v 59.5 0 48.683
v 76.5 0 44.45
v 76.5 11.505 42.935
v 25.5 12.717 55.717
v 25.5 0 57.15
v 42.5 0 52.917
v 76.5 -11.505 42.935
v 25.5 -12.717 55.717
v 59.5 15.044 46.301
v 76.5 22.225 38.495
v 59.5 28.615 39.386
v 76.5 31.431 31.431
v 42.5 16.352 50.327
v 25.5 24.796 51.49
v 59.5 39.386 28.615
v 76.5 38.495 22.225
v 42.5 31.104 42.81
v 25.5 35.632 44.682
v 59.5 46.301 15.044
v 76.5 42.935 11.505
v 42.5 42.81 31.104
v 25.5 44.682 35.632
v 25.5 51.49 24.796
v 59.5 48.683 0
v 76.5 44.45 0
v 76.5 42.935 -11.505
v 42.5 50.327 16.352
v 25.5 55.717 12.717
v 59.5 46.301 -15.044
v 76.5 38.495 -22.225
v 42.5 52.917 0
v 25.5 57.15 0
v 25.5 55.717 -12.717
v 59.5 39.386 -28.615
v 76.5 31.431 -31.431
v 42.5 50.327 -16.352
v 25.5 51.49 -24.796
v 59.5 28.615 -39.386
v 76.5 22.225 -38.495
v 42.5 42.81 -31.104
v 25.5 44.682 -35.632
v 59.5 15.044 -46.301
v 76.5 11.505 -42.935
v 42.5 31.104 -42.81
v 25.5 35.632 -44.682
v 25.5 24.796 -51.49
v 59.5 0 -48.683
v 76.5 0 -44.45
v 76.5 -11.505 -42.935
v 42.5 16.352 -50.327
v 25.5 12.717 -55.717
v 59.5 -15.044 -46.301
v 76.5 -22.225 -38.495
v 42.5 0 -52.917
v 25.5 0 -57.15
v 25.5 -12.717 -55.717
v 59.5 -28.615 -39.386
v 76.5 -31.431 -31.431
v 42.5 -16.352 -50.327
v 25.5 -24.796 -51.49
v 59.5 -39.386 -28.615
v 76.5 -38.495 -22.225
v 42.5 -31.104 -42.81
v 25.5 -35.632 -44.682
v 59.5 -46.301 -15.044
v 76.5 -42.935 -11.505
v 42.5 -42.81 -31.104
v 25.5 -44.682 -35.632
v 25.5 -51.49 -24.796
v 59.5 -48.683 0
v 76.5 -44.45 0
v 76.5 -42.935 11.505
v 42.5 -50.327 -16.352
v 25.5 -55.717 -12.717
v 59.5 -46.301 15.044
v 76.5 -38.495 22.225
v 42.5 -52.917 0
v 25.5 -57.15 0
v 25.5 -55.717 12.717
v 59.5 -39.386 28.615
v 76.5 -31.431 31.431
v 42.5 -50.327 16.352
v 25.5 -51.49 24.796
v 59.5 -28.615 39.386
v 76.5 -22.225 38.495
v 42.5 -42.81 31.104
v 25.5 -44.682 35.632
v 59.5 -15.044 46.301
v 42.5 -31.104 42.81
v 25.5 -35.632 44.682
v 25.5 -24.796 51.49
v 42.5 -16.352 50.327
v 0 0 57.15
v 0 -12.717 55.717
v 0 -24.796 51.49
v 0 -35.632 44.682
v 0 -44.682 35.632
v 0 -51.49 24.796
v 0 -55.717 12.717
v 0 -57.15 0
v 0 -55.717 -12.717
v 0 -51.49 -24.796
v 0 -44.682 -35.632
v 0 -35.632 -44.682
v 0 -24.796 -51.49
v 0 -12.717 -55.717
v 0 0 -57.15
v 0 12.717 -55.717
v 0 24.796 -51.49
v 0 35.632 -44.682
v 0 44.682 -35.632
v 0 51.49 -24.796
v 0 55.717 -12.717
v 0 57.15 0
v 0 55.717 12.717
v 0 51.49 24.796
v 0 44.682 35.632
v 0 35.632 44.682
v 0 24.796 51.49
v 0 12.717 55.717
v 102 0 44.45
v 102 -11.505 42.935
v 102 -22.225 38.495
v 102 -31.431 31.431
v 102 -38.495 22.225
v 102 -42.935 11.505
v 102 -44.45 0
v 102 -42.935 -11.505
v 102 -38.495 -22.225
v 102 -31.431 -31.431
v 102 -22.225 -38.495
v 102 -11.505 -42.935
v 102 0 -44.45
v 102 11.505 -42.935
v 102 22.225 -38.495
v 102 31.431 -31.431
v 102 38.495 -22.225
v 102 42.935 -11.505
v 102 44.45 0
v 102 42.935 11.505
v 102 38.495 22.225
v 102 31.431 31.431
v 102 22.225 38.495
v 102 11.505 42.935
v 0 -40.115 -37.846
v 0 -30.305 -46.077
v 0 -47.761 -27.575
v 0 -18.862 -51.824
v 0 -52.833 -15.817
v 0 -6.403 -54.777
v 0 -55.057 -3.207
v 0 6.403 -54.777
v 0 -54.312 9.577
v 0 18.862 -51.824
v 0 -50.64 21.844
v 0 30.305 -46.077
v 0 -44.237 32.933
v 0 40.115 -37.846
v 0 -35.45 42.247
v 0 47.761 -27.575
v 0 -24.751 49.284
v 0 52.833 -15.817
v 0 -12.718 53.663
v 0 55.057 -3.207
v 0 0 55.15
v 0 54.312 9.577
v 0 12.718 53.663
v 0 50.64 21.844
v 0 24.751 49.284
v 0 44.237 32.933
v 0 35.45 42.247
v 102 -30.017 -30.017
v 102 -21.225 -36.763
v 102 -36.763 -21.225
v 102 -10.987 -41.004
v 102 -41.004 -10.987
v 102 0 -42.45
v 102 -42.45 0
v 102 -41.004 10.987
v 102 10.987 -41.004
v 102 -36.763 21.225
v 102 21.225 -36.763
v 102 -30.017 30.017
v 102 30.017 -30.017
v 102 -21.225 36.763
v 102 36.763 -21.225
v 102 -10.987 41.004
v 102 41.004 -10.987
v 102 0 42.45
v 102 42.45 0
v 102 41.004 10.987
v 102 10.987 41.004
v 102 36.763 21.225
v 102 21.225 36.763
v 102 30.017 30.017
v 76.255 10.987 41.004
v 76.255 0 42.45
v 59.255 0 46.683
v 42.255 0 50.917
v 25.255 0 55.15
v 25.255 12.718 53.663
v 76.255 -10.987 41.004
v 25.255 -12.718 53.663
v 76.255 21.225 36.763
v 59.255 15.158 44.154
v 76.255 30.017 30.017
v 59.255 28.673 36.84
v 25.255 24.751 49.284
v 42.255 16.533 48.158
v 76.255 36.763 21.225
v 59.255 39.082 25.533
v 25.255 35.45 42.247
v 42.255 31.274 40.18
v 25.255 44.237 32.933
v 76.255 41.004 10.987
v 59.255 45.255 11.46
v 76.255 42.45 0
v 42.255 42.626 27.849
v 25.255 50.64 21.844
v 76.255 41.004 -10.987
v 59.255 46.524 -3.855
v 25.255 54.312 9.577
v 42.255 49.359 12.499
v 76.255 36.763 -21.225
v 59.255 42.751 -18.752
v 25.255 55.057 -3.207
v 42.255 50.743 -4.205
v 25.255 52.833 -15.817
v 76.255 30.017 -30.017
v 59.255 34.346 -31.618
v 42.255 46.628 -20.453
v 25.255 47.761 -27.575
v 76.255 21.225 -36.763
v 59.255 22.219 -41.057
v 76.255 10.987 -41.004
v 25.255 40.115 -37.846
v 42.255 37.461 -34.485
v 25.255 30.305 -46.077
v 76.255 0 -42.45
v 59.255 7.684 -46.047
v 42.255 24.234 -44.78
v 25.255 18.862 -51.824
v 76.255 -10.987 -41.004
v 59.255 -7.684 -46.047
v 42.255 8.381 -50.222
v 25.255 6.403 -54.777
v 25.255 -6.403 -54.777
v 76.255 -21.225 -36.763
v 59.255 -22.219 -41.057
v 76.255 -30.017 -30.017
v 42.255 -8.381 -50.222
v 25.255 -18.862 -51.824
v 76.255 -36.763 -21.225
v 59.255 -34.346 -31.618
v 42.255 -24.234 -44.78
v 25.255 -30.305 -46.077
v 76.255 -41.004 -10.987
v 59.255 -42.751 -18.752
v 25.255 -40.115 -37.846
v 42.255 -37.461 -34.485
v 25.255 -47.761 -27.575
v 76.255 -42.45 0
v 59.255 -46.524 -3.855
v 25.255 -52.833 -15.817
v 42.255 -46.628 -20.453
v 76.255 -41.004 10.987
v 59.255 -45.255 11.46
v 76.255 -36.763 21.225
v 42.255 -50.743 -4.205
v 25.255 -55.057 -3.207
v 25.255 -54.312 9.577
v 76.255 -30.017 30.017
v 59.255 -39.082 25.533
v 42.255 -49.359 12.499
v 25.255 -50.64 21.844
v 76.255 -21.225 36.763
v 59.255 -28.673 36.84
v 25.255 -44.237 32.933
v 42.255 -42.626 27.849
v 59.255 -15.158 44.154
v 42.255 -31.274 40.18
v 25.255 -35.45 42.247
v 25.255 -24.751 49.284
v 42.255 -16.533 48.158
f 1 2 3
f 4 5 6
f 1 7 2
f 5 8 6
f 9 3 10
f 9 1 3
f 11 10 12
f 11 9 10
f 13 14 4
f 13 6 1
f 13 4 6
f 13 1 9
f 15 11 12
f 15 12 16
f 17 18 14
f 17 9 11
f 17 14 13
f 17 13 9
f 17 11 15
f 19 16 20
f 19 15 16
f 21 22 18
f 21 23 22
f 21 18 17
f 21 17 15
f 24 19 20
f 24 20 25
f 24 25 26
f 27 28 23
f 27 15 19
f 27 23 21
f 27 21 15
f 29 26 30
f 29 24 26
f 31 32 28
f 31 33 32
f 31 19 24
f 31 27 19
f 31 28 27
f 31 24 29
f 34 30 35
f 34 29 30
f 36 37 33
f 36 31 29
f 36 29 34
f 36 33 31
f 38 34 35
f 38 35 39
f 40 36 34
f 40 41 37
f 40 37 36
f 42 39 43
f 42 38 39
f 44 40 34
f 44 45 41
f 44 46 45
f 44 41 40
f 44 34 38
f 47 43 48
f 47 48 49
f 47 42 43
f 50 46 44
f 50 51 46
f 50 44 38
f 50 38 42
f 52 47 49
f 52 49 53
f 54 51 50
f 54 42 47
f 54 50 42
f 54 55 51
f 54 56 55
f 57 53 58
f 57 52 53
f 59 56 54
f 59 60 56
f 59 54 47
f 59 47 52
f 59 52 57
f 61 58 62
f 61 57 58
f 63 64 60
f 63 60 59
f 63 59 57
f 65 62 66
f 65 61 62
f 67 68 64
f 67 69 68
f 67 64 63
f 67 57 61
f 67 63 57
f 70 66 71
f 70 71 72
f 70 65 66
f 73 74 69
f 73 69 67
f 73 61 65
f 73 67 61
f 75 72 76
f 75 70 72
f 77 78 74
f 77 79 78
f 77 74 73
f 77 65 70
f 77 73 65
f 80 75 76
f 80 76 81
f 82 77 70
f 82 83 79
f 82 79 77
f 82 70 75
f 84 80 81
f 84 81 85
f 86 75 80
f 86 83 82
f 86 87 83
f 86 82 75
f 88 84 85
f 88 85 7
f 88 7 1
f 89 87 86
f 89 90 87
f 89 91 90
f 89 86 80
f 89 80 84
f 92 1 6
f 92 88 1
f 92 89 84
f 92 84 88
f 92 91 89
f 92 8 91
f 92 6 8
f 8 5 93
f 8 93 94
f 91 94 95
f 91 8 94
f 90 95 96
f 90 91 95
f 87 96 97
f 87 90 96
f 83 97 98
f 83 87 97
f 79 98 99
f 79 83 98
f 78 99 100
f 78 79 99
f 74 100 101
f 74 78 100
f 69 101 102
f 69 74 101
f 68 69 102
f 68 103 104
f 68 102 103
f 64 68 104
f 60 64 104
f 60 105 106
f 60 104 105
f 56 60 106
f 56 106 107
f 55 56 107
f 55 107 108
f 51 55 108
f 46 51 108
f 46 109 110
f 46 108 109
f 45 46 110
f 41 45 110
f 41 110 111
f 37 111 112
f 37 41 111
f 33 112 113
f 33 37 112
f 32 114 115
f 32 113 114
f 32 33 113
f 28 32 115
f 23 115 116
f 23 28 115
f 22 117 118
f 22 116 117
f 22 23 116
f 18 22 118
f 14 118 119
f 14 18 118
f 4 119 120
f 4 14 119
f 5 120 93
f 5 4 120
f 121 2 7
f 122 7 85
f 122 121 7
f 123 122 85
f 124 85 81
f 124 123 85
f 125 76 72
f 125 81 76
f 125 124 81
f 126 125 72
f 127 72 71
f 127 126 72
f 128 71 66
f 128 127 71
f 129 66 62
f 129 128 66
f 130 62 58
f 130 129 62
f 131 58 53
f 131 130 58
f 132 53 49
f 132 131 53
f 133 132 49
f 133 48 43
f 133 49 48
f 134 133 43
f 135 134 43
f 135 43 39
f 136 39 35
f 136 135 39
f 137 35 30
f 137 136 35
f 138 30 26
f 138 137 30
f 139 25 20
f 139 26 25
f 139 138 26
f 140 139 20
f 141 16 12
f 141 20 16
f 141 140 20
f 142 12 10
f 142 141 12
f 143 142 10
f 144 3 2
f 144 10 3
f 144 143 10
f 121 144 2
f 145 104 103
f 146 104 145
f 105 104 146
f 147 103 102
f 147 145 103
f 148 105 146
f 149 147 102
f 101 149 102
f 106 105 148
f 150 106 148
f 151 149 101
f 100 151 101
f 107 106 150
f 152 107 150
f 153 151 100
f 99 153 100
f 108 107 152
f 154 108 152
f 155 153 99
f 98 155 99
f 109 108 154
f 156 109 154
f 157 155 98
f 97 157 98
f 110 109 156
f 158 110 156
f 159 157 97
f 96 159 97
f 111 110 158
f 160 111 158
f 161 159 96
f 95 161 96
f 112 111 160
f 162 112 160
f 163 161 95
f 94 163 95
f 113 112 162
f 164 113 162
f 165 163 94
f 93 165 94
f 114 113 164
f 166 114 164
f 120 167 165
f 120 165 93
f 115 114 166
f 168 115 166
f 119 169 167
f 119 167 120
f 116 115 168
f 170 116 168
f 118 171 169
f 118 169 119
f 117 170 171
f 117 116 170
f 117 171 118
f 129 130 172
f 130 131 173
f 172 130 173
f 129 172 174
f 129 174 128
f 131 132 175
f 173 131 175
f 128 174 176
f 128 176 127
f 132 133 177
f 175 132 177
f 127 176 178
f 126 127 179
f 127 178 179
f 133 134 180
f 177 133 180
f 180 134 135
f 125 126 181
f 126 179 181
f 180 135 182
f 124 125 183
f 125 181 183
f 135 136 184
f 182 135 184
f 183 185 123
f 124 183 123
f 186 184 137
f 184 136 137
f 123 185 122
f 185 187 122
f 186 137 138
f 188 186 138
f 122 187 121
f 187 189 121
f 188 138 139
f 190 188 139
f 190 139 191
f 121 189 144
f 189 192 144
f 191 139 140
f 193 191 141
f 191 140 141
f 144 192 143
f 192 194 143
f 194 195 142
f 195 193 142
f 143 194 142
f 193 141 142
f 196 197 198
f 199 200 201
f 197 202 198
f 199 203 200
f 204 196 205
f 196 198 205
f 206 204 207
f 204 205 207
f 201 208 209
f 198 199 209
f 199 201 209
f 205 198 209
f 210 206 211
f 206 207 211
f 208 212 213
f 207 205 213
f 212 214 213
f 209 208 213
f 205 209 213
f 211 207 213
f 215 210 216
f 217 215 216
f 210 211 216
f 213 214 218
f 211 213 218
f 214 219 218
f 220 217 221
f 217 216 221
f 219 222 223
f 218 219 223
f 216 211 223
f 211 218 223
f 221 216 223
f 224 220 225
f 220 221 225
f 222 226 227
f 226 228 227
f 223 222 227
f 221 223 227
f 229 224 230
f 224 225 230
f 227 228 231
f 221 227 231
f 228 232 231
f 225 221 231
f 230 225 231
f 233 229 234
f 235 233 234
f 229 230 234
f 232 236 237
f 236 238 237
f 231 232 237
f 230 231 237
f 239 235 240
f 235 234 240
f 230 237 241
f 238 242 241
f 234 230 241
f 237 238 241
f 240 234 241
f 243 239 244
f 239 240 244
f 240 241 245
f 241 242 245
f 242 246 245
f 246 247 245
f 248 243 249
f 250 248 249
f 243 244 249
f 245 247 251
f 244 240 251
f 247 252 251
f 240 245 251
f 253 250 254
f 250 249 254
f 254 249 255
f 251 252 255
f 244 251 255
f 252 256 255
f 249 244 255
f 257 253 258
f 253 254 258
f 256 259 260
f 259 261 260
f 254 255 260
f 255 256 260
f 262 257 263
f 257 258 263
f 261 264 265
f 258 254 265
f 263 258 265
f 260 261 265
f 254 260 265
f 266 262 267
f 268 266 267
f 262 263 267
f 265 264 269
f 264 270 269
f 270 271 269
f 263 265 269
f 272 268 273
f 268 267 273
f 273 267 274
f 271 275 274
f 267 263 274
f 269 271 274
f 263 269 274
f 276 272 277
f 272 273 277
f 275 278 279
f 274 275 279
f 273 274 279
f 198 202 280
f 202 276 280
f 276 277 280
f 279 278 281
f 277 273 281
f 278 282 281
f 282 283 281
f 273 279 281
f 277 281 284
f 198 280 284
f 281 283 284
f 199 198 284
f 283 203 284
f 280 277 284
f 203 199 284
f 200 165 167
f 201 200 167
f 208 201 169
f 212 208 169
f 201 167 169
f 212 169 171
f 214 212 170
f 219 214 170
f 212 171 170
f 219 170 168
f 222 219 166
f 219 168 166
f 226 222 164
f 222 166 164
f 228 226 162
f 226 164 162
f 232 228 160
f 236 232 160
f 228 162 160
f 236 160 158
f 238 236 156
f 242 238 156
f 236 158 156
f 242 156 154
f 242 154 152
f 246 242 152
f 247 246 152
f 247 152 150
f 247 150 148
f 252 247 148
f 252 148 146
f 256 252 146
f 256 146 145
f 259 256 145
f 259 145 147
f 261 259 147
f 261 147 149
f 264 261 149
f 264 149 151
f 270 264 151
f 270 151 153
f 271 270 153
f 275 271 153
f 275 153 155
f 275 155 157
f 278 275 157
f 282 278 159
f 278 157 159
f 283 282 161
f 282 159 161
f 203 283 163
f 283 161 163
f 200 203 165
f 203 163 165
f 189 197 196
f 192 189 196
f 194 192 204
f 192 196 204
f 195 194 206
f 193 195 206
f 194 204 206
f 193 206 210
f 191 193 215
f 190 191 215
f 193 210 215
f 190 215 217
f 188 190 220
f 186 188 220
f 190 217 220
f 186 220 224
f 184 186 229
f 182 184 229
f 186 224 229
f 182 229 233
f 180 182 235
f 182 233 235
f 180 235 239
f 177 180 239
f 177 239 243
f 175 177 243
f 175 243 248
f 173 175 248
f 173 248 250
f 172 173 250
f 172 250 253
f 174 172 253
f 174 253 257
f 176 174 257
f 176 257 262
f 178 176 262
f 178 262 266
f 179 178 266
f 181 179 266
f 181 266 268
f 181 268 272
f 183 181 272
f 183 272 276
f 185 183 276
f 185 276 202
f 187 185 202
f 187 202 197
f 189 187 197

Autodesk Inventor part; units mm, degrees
ref_plane "YZ Plane" through (0, 0, 0) normal (1, 0, 0) x (0, 1, 0)
ref_plane "XZ Plane" through (0, 0, 0) normal (0, 1, 0) x (-1, 0, 0)
ref_plane "XY Plane" through (0, 0, 0) normal (0, 0, 1) x (1, 0, 0)
sketch "Sketch1" plane through (0, 0, 0) normal (0, 1, 0) x (-1, 0, 0)
  line L0 (0, 57.15) -> (-25.5, 57.15)
  line L1 (-25.5, 57.15) -> (-76.5, 44.45)
  line L2 (-76.5, 44.45) -> (-102, 44.45)
  line L3 (-102, 0) -> (0, 0)
  line L4 (-102, 42.45) -> (-76.2547, 42.45)
  line L5 (-76.2547, 42.45) -> (-25.2547, 55.15)
  line L6 (-25.2547, 55.15) -> (0, 55.15)
  line L7 (-102, 0) -> (-102, 42.45) construction
  line L8 (-102, 44.45) -> (-102, 42.45)
  line L9 (0, 57.15) -> (0, 55.15)
  line L10 (0, 0) -> (0, 55.15) construction
  dimension "d0" = 114.3
  dimension "d1" = 88.9
  dimension "d2" = 2
  dimension "d3" = 2
  dimension "d4" = 102
  dimension "d5" = 25.5
  dimension "d6" = 25.5
  dimension "d7" = 2
revolve "Revolution1" add sketch "Sketch1" angle 360 about axis through (102, 0, 0) along (-1, 0, 0)
equation "\"d0\" = D"
equation "\"d1\" = D1"
equation "\"d2\" = T"
equation "\"d3\" = T1"
equation "\"d4\" = L"
equation "\"d5\" = 0.25 * L"
equation "\"d6\" = 0.25 * L"
equation "\"d7\" = T"
equation "\"T\" = 2"
equation "\"D\" = 114.3"
equation "\"D1\" = 88.9"
equation "\"L\" = 102"
equation "\"T1\" = 2"
equation "\"Size_Designation\" = 1.2345"
properties part number "ISO 5251 Concentric reducers DN100 x DN80 2" material "Stainless Steel"
